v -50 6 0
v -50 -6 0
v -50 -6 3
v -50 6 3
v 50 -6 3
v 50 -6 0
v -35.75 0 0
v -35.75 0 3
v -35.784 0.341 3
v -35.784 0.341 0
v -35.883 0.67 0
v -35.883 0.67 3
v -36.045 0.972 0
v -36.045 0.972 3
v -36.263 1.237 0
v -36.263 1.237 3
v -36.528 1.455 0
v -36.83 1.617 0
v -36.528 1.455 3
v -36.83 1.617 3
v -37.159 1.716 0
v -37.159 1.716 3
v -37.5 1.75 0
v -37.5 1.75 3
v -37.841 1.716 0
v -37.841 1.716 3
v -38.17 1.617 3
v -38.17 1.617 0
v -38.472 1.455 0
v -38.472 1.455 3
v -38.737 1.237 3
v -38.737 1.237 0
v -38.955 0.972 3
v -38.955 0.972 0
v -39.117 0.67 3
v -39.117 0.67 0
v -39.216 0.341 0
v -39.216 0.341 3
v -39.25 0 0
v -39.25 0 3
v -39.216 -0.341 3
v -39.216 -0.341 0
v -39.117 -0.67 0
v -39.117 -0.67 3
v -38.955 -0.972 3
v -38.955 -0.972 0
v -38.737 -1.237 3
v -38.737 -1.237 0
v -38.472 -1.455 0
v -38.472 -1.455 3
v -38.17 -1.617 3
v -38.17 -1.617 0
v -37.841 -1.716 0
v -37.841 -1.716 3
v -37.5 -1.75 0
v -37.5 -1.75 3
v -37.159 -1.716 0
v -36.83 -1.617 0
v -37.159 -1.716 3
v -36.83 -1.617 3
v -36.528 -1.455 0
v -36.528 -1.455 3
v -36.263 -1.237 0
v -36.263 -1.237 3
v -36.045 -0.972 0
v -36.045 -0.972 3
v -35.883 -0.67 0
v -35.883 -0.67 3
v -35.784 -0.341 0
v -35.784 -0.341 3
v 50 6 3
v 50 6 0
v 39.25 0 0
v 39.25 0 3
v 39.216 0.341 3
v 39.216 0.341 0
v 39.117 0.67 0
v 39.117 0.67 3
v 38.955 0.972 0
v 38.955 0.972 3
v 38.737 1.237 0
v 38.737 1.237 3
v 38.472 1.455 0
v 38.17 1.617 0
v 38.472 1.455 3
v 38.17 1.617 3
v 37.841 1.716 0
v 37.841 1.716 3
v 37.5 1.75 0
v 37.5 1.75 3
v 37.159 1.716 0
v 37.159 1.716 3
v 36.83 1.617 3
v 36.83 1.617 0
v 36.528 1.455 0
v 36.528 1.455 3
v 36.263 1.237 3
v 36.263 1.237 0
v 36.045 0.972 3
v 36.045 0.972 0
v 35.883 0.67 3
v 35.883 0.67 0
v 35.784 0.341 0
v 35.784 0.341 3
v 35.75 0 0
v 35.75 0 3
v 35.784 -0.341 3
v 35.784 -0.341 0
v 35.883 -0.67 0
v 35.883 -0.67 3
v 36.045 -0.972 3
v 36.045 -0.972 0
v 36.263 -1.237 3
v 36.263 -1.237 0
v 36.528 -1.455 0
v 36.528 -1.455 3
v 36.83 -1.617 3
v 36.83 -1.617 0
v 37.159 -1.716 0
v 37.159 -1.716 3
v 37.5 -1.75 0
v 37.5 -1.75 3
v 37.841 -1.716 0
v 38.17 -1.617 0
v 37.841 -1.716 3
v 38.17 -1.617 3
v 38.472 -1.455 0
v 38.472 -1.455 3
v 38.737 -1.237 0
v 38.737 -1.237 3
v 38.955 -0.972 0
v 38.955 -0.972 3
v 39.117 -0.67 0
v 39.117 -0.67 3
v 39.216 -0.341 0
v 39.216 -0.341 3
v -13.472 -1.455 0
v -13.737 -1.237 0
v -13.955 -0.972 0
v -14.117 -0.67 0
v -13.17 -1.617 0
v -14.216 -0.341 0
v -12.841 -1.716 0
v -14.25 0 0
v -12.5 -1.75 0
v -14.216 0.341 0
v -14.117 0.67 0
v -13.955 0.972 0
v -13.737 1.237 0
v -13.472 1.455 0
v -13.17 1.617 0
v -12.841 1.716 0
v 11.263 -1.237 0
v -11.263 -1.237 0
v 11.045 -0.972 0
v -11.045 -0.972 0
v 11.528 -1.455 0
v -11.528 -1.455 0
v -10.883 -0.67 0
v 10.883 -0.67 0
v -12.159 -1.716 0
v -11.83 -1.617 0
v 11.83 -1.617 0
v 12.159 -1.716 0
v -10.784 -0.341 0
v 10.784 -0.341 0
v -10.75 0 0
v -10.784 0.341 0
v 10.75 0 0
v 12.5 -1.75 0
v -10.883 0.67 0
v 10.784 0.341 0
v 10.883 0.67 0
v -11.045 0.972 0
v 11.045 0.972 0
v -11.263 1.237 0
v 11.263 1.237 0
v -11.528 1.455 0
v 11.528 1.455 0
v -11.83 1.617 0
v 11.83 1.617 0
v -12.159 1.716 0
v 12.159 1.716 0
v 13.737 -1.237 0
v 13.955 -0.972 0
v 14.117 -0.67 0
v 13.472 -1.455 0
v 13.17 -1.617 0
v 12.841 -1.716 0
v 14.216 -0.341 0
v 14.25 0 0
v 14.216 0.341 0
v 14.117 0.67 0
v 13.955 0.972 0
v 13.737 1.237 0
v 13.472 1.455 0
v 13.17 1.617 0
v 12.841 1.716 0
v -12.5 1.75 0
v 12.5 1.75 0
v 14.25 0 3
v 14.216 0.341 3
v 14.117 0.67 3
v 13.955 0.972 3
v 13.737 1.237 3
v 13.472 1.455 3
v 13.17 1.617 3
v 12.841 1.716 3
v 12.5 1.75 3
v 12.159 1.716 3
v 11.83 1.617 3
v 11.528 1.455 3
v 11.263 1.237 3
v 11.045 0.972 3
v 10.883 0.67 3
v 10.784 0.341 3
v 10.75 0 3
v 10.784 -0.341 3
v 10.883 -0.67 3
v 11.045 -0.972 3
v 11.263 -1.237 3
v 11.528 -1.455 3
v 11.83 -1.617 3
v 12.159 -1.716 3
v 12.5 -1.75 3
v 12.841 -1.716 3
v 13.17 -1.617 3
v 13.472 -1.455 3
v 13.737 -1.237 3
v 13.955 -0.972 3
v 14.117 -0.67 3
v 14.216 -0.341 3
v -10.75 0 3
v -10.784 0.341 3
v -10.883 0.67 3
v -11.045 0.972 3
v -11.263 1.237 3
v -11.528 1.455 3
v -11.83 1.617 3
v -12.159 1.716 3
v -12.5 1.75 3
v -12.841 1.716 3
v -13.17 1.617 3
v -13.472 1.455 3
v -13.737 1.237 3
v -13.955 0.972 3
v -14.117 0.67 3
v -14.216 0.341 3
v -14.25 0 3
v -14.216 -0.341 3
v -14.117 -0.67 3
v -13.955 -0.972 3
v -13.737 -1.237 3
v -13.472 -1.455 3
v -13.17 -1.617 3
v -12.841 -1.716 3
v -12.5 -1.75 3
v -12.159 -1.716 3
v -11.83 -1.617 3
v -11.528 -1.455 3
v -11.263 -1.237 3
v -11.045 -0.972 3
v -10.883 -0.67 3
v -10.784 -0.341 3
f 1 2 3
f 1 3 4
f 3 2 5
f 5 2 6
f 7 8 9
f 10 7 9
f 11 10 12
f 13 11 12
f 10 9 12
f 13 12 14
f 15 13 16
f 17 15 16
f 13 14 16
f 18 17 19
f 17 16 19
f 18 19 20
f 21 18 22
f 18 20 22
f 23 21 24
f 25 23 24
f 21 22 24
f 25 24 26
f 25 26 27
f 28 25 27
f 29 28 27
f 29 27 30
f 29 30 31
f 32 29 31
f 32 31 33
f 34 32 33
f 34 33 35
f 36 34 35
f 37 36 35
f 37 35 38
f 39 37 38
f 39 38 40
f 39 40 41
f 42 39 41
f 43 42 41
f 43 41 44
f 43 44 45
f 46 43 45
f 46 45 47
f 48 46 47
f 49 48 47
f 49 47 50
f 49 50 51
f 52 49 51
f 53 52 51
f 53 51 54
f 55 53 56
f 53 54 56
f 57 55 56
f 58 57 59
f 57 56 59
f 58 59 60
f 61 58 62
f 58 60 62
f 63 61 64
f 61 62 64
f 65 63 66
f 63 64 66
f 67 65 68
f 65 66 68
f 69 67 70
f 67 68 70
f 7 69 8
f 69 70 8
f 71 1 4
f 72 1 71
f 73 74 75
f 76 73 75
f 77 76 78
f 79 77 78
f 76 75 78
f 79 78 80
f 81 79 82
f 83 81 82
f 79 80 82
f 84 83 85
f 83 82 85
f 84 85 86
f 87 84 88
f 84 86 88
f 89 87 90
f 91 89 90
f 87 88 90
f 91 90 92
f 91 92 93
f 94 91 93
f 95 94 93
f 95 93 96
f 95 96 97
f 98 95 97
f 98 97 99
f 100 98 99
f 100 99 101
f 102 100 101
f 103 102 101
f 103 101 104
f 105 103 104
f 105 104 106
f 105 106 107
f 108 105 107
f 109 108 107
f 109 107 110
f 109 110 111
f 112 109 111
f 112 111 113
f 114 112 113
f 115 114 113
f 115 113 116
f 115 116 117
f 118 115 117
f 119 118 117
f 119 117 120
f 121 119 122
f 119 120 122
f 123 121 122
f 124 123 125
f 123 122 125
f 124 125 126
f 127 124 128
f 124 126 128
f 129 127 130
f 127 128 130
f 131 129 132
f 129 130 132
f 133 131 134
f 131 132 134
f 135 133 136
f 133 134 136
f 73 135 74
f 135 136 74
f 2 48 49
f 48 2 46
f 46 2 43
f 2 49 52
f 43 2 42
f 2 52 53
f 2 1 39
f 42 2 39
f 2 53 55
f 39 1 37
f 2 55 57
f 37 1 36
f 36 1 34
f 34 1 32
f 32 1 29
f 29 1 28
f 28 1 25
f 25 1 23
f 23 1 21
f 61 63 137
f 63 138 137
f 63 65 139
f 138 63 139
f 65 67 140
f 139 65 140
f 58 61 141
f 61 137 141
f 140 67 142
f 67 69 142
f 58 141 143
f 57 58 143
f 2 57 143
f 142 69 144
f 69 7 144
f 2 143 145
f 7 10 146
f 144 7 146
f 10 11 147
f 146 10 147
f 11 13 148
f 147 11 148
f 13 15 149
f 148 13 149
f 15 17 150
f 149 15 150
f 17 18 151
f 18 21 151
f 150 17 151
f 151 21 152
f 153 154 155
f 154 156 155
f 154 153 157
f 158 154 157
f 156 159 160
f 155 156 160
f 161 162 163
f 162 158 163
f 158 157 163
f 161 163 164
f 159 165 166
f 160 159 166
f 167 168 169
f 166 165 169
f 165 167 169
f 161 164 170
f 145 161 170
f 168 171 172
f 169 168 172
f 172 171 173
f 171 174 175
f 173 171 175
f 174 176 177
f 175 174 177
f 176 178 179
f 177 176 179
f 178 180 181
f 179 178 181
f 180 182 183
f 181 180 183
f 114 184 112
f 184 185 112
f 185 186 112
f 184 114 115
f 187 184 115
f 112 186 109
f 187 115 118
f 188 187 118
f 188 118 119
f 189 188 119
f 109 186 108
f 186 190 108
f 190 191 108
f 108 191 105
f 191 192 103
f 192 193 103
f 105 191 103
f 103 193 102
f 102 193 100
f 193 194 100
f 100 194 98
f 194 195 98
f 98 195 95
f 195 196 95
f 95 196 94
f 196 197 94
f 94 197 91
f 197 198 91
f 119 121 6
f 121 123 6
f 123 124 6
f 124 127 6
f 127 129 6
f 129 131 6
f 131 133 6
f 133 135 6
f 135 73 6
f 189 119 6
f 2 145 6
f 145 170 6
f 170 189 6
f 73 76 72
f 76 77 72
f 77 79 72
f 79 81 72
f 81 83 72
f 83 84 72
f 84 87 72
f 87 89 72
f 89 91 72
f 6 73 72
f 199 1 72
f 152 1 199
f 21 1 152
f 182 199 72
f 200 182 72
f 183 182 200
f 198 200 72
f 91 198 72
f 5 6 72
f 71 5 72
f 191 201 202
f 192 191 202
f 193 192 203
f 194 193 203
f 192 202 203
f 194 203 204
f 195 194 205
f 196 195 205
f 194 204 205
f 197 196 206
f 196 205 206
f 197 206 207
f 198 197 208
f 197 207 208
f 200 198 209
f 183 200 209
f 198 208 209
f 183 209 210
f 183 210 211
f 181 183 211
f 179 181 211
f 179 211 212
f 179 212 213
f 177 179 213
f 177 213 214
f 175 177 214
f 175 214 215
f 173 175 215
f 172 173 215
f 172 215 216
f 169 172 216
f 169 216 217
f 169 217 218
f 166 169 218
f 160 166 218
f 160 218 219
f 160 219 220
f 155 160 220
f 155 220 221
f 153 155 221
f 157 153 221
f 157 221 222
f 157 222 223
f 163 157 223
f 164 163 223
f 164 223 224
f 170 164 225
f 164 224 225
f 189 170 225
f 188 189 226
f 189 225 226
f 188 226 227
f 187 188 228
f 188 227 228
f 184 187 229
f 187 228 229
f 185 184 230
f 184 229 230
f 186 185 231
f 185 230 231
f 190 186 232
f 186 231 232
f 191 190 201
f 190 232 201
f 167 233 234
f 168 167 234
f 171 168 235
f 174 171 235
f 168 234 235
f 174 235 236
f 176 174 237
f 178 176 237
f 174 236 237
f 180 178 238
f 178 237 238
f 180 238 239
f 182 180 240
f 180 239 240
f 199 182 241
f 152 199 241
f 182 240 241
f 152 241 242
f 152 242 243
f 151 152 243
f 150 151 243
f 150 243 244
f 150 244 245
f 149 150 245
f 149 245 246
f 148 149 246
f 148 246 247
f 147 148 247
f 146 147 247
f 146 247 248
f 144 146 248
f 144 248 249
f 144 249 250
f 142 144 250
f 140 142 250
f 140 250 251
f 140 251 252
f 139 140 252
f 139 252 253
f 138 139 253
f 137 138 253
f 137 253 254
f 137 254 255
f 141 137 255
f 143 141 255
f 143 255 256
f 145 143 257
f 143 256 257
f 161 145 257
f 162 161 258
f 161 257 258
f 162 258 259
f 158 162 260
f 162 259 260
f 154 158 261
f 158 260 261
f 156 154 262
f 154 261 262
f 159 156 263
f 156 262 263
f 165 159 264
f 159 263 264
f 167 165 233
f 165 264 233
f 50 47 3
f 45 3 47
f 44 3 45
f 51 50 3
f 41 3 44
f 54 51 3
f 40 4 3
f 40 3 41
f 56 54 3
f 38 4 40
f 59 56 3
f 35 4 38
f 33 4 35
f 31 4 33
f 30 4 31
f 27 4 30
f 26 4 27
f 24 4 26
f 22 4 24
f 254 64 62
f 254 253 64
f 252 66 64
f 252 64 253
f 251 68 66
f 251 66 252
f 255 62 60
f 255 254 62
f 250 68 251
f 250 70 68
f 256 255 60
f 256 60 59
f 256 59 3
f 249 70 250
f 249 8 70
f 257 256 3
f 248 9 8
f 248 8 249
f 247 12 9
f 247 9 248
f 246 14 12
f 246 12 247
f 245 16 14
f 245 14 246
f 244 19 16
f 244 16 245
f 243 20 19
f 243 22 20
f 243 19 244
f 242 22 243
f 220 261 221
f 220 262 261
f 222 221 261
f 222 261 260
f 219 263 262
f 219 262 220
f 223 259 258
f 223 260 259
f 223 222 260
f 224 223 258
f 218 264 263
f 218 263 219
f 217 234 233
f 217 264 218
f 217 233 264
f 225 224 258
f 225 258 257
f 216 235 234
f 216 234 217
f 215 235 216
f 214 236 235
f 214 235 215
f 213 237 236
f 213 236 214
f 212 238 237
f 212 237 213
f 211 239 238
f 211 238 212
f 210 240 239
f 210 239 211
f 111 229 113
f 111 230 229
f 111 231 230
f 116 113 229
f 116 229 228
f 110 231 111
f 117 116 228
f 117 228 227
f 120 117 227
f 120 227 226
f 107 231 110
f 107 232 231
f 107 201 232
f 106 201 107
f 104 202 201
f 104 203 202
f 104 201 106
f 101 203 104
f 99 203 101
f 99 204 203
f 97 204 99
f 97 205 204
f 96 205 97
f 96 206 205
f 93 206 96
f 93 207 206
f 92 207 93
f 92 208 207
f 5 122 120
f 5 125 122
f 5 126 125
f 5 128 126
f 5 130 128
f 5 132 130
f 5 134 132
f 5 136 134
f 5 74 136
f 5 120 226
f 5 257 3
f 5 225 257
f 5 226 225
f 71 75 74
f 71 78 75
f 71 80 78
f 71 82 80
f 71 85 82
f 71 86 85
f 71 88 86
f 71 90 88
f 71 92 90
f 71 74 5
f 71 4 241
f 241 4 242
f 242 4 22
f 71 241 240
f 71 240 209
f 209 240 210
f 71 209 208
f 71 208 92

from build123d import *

# Parameters (mm, degrees)
SKETCH1_W           = 100
SKETCH1_H           = 12
BOSS_EXTRUDE1_DEPTH = 3
SKETCH7_R           = 1.75
CUT_EXTRUDE1_DEPTH  = 4
LPATTERN1_COUNT     = 4
LPATTERN1_PITCH     = 25


with BuildPart() as part:
    # Sketch1 → Boss-Extrude1 (new body)
    with BuildSketch(Plane.XY):
        Rectangle(SKETCH1_W, SKETCH1_H)
    extrude(amount=BOSS_EXTRUDE1_DEPTH)

    # Sketch7 → Cut-Extrude1 (cut, through all)
    with BuildSketch(Plane.XY.offset(3)):
        with Locations((37.5, 0)):
            Circle(SKETCH7_R)
    cut_extrude1 = extrude(amount=-CUT_EXTRUDE1_DEPTH, mode=Mode.SUBTRACT)

    # LPattern1: Cut-Extrude1 ×4
    with Locations(*[(-i * LPATTERN1_PITCH, 0, 0) for i in range(1, LPATTERN1_COUNT)]):
        add(cut_extrude1, mode=Mode.SUBTRACT)


solid = part.part
